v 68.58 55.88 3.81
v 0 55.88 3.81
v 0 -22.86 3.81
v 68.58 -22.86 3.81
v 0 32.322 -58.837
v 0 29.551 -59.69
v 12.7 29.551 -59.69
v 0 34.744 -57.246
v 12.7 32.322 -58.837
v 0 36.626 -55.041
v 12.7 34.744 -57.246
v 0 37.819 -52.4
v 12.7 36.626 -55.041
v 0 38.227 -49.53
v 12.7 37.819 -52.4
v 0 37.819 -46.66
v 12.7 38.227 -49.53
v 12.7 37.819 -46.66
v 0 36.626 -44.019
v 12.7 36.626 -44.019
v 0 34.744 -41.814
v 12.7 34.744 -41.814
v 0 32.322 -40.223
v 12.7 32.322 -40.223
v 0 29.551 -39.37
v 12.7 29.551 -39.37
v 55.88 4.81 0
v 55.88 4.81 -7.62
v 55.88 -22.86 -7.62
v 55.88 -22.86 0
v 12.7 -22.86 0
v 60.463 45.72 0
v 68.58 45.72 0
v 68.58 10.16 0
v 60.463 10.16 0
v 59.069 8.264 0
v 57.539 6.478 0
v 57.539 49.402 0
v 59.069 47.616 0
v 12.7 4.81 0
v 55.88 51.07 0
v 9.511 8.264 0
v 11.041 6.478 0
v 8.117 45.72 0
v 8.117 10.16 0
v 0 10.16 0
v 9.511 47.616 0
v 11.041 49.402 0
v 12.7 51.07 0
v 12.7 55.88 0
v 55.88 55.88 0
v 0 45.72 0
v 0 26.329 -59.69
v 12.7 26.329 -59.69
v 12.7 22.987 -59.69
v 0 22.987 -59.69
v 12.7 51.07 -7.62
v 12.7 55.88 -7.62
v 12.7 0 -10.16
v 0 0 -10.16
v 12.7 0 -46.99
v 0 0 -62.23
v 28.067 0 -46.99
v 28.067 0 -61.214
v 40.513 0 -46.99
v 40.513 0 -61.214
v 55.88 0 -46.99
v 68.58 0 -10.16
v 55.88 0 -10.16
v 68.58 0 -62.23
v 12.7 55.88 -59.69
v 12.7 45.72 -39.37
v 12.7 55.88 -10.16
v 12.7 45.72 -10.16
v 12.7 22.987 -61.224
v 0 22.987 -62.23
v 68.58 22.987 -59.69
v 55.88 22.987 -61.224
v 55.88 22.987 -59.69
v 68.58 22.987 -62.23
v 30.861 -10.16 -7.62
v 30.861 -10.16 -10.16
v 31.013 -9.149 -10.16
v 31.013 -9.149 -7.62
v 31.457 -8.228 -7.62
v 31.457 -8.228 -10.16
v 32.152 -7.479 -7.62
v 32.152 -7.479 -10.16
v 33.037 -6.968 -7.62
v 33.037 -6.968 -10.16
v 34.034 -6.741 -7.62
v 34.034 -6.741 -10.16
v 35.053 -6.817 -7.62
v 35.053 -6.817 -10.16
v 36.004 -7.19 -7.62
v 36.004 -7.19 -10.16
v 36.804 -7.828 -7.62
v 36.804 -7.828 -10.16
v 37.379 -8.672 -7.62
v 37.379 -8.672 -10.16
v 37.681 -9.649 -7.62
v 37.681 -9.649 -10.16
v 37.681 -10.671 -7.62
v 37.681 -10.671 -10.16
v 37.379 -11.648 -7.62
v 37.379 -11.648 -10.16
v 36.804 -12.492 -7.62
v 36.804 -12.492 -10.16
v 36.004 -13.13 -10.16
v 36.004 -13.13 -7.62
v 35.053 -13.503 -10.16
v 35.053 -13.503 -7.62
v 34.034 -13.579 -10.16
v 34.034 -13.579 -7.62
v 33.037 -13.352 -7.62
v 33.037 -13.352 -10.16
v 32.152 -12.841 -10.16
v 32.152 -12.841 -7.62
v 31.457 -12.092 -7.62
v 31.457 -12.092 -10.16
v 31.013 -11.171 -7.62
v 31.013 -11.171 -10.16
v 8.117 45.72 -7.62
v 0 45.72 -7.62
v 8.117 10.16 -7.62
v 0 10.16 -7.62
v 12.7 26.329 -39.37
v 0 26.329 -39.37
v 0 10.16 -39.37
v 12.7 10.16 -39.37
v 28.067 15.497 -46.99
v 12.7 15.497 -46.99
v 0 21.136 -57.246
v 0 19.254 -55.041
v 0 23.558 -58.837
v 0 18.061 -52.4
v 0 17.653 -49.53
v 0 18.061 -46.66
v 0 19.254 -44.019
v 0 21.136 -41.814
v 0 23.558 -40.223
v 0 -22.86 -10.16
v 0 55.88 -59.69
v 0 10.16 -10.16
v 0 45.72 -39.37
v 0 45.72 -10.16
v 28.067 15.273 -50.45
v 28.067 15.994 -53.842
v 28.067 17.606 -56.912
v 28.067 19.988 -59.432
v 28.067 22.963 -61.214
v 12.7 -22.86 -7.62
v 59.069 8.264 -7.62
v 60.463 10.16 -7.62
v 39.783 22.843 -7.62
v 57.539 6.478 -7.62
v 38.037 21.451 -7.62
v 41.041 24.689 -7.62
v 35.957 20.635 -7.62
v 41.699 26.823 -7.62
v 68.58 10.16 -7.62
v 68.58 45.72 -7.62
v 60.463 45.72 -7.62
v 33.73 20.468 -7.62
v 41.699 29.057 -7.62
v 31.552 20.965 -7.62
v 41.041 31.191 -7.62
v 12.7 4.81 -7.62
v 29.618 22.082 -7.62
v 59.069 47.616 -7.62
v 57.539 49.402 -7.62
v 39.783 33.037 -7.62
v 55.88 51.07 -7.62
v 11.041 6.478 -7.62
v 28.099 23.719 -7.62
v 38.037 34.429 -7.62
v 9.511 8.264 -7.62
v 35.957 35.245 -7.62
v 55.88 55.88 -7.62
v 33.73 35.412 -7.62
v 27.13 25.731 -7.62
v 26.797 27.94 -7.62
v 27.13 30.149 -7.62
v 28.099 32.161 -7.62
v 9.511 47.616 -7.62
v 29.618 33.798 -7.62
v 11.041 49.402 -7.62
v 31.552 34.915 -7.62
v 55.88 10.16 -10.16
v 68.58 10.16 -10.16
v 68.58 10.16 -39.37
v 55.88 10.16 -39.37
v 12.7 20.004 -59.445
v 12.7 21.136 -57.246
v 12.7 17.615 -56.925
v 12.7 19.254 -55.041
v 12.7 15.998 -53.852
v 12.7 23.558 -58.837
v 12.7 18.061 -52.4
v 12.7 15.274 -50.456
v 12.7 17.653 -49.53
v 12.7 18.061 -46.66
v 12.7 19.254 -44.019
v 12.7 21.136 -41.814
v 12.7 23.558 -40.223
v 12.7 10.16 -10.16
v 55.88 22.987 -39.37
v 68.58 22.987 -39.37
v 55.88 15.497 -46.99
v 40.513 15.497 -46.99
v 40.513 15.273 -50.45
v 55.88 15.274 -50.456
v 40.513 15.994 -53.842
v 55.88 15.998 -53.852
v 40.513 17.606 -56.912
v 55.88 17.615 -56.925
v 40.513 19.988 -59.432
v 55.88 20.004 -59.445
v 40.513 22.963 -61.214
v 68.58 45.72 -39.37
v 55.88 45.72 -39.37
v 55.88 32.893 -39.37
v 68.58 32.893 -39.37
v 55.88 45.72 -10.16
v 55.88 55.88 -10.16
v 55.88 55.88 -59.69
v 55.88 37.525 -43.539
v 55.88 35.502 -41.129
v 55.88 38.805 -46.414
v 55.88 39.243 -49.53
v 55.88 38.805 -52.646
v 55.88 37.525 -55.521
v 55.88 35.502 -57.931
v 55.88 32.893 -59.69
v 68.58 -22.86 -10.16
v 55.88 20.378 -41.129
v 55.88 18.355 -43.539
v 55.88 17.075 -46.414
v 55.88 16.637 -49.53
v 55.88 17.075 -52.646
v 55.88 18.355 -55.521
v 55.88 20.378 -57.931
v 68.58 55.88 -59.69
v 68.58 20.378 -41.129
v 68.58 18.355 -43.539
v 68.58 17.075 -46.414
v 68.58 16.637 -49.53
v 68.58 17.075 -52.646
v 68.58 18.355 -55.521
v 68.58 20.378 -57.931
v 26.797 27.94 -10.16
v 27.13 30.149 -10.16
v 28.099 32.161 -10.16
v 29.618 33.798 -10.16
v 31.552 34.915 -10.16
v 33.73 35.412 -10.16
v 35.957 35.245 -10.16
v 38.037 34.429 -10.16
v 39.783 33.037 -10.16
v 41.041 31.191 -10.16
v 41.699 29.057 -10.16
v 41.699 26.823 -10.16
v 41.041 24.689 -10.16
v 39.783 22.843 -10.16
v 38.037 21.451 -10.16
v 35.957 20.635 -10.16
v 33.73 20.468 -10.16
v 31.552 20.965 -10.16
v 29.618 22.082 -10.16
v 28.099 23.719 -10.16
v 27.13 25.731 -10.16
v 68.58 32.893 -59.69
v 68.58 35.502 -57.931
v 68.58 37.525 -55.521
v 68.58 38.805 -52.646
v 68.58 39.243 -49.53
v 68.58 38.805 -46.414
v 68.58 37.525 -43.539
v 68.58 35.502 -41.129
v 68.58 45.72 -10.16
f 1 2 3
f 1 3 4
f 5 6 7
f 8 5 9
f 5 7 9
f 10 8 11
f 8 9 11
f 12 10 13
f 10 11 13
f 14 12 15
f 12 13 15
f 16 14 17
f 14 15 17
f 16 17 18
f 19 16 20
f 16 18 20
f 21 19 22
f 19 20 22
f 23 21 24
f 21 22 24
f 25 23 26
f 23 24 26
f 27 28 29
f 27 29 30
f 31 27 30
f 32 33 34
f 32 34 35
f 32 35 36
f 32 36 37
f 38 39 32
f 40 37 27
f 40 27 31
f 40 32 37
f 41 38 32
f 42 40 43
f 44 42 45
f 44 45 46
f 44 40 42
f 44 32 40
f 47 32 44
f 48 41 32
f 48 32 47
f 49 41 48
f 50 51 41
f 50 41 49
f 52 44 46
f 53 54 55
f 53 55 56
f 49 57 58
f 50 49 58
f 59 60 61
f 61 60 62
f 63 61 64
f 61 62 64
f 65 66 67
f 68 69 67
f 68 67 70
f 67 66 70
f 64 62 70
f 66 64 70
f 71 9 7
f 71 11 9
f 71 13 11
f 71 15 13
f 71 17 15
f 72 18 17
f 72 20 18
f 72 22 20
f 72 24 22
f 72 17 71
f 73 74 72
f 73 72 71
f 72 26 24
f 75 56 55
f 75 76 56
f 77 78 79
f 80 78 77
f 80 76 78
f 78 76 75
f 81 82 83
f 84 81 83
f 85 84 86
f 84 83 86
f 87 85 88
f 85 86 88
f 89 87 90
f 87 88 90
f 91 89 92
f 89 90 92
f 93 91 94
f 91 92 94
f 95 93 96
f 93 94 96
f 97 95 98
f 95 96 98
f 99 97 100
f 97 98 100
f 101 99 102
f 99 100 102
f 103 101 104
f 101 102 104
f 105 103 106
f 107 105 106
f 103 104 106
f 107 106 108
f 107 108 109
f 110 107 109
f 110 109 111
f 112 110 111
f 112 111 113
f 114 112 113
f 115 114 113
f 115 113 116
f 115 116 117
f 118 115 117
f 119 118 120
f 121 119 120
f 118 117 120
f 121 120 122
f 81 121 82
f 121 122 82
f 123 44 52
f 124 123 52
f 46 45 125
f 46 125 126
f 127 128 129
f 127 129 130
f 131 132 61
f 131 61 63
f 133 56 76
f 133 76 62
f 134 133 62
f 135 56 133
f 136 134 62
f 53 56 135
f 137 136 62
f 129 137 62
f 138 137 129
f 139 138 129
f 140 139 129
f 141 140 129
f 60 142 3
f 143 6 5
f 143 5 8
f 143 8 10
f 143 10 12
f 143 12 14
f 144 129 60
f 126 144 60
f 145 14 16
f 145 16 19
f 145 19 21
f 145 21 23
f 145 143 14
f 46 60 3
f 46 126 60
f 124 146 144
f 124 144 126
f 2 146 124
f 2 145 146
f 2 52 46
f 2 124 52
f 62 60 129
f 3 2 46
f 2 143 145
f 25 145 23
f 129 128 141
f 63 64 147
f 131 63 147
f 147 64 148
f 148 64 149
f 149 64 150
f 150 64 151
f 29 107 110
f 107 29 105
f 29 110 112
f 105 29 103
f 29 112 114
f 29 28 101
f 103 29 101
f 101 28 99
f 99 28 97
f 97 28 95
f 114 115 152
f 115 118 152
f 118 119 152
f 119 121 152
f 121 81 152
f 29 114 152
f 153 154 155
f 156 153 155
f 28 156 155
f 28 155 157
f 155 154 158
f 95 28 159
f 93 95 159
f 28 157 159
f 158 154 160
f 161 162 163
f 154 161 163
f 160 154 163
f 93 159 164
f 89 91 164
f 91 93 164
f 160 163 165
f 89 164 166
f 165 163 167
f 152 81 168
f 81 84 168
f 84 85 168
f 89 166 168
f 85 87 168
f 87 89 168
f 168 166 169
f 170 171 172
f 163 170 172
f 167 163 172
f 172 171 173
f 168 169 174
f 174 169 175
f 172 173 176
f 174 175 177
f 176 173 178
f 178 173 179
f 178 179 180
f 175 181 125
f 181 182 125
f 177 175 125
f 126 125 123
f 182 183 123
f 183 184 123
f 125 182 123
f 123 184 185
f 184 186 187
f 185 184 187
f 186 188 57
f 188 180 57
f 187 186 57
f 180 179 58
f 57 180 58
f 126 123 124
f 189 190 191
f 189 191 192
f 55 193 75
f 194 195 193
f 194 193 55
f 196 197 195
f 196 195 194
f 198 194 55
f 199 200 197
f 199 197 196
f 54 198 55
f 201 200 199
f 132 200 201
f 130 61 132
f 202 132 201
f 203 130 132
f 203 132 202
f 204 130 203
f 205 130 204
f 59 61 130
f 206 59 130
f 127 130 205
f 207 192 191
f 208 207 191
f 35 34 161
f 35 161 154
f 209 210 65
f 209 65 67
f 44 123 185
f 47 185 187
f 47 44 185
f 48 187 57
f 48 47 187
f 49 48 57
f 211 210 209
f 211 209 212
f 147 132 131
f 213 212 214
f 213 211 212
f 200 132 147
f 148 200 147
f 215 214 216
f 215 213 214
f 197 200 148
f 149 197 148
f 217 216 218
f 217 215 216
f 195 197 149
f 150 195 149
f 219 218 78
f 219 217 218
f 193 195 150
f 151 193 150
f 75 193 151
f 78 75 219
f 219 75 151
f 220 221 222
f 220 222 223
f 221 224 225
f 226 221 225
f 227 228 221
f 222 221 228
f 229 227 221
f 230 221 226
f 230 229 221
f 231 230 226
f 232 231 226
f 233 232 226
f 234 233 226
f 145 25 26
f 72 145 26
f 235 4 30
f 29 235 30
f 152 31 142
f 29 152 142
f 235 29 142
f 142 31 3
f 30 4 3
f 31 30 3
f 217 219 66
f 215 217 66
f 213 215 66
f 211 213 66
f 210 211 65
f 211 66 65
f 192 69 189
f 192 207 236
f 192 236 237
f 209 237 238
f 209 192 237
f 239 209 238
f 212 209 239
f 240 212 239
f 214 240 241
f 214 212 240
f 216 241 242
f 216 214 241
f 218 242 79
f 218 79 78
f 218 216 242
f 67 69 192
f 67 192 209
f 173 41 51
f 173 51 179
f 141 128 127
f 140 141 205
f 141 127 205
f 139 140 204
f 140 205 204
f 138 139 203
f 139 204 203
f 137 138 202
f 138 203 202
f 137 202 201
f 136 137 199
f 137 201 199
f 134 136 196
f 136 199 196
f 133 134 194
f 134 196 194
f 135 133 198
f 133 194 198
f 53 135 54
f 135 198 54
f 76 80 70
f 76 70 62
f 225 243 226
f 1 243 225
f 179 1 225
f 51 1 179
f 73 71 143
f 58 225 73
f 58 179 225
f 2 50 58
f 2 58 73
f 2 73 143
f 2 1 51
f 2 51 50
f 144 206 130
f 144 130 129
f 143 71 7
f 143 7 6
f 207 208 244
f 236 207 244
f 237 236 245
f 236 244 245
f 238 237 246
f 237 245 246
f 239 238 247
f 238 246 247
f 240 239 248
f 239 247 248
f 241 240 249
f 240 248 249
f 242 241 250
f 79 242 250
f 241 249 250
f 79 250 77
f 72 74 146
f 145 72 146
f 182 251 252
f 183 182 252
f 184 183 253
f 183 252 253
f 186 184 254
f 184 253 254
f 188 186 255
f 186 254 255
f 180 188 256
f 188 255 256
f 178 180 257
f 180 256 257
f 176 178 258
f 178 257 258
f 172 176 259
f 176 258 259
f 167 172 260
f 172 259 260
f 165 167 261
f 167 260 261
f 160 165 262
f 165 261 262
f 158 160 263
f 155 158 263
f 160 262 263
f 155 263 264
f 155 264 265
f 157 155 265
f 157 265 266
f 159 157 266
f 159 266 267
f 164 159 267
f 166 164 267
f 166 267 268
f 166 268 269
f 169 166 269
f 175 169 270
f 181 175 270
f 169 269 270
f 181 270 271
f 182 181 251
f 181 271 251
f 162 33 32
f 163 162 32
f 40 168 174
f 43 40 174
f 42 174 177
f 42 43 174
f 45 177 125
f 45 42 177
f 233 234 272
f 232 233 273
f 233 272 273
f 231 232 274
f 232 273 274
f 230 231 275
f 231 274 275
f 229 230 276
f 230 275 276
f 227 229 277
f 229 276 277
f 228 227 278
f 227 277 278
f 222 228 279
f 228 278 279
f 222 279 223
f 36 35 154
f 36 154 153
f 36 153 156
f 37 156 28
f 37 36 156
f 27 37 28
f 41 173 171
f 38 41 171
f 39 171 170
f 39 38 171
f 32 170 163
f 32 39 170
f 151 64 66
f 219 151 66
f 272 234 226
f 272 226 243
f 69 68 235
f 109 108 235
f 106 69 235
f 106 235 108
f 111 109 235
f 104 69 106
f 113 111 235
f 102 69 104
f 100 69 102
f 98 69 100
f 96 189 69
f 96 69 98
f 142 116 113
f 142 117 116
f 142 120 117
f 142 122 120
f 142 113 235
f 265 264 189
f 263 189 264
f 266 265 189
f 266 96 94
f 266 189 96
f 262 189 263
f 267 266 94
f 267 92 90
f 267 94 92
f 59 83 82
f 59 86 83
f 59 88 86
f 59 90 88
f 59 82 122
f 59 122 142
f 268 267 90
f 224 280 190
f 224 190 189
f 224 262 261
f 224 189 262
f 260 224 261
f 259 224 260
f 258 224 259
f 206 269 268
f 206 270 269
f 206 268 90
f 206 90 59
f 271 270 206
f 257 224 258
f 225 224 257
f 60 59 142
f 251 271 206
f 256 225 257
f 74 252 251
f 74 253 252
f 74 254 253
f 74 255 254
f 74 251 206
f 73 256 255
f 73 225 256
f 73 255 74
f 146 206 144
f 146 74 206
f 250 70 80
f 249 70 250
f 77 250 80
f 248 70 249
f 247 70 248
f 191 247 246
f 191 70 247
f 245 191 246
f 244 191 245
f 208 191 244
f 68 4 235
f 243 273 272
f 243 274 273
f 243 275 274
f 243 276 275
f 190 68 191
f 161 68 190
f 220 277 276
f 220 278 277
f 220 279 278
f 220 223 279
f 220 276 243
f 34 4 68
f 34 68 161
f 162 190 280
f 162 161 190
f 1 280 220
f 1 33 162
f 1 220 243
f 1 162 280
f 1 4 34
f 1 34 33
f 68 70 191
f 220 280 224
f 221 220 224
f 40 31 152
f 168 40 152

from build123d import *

# Parameters (mm, degrees)
SKETCH1_W           = 68.58
SKETCH1_H           = 55.88
BOSS_EXTRUDE1_DEPTH = 3.81
SKETCH2_W           = 12.7
SKETCH2_H           = 10.16
BOSS_EXTRUDE2_DEPTH = 59.69
SKETCH6_W           = 12.7
SKETCH6_H           = 20.32
BOSS_EXTRUDE3_DEPTH = 35.56
CUT_EXTRUDE1_REACH  = 108.718
SKETCH4_R           = 11.303
SKETCH7_W           = 68.58
SKETCH7_H           = 55.88
SKETCH7_W_2         = 43.18
SKETCH7_H_2         = 22.86
BOSS_EXTRUDE4_DEPTH = 2.54
SKETCH8_R           = 3.429
SKETCH8_R_2         = 7.493
CUT_EXTRUDE2_DEPTH  = 2.54
SKETCH9_W           = 68.58
SKETCH9_H           = 22.987
BOSS_EXTRUDE5_DEPTH = 2.54
CUT_EXTRUDE3_REACH  = 110.159
SKETCH10_W          = 12.446
SKETCH10_H          = 3.048
SKETCH11_W          = 15.367
SKETCH11_H          = 22.987
BOSS_EXTRUDE6_DEPTH = 12.7
BOSS_EXTRUDE7_DEPTH = 22.86
CUT_EXTRUDE5_START  = -43.18
SKETCH14_R          = 12.7
CUT_EXTRUDE5_DEPTH  = 43.18
CUT_EXTRUDE6_REACH  = 102.587
SKETCH13_R          = 10.287
SKETCH15_R          = 31.640904619
CUT_EXTRUDE7_DEPTH  = 7.62


with BuildPart() as part:
    # Sketch1 → Boss-Extrude1 (new body)
    with BuildSketch(Plane.XY):
        with Locations((34.29, 27.94)):
            Rectangle(SKETCH1_W, SKETCH1_H)
    extrude(amount=BOSS_EXTRUDE1_DEPTH)

    # Sketch2 → Boss-Extrude2 (add)
    with BuildSketch(Plane(origin=(0, 0, 0), x_dir=(-1, 0, 0), z_dir=(0, 0, -1))):
        with Locations((-6.35, 50.8)):
            Rectangle(SKETCH2_W, SKETCH2_H)
        with Locations((-62.23, 50.8)):
            Rectangle(SKETCH2_W, SKETCH2_H)
        with Locations((-6.35, 5.08)):
            Rectangle(SKETCH2_W, SKETCH2_H)
        with Locations((-62.23, 5.08)):
            Rectangle(SKETCH2_W, SKETCH2_H)
    extrude(amount=BOSS_EXTRUDE2_DEPTH)

    # Sketch6 → Boss-Extrude3 (add)
    with BuildSketch(Plane(origin=(0, 10.16, 0), x_dir=(1, 0, 0), z_dir=(0, 1, 0))):
        with Locations((62.23, 49.53)):
            Rectangle(SKETCH6_W, SKETCH6_H)
        with Locations((6.35, 49.53)):
            Rectangle(SKETCH6_W, SKETCH6_H)
    extrude(amount=BOSS_EXTRUDE3_DEPTH)

    # Sketch4 → Cut-Extrude1 (cut, up to next)
    with BuildSketch(Plane(origin=(68.58, 0, 0), x_dir=(0, 0, -1), z_dir=(1, 0, 0)), mode=Mode.PRIVATE) as cut_extrude1_sk1:
        with Locations((49.53, 27.94)):
            Circle(SKETCH4_R)
    cut_extrude1_tool1 = extrude(cut_extrude1_sk1.sketch, amount=-CUT_EXTRUDE1_REACH, mode=Mode.PRIVATE) & part.part
    add(cut_extrude1_tool1.solids().sort_by_distance((68.58, 27.94, -49.53))[0], mode=Mode.SUBTRACT)

    # Sketch7 → Boss-Extrude4 (add)
    with BuildSketch(Plane(origin=(0, 0, -7.62), x_dir=(-1, 0, 0), z_dir=(0, 0, -1))):
        with Locations((-34.29, 27.94)):
            Rectangle(SKETCH7_W, SKETCH7_H)
        with Locations((-34.29, -11.43)):
            Rectangle(SKETCH7_W_2, SKETCH7_H_2)
    extrude(amount=BOSS_EXTRUDE4_DEPTH)

    # Sketch8 → Cut-Extrude2 (cut)
    with BuildSketch(Plane(origin=(0, 0, -10.16), x_dir=(-1, 0, 0), z_dir=(0, 0, -1))):
        with Locations((-34.29, -10.16)):
            Circle(SKETCH8_R)
        with Locations((-34.29, 27.94)):
            Circle(SKETCH8_R_2)
    extrude(amount=-CUT_EXTRUDE2_DEPTH, mode=Mode.SUBTRACT)

    # Sketch9 → Boss-Extrude5 (add)
    with BuildSketch(Plane(origin=(0, 0, -59.69), x_dir=(-1, 0, 0), z_dir=(0, 0, -1))):
        with Locations((-34.29, 11.4935)):
            Rectangle(SKETCH9_W, SKETCH9_H)
    extrude(amount=BOSS_EXTRUDE5_DEPTH)

    # Sketch10 → Cut-Extrude3 (cut, up to next)
    with BuildSketch(Plane.XZ, mode=Mode.PRIVATE) as cut_extrude3_sk1:
        with Locations((34.29, -59.69)):
            Rectangle(SKETCH10_W, SKETCH10_H)
    cut_extrude3_tool1 = extrude(cut_extrude3_sk1.sketch, amount=-CUT_EXTRUDE3_REACH, mode=Mode.PRIVATE) & part.part
    add(cut_extrude3_tool1.solids().sort_by_distance((34.29, 0, -59.69))[0], mode=Mode.SUBTRACT)

    # Sketch11 → Boss-Extrude6 (add)
    with BuildSketch(Plane.XY.offset(-59.69)):
        with Locations((20.3835, 11.4935)):
            Rectangle(SKETCH11_W, SKETCH11_H)
        with Locations((48.1965, 11.4935)):
            Rectangle(SKETCH11_W, SKETCH11_H)
    extrude(amount=BOSS_EXTRUDE6_DEPTH)

    # Sketch12 → Boss-Extrude7 (add)
    with BuildSketch(Plane.XZ):
        Polygon((12.7, -10.16), (0, -10.16), (0, 3.81), (68.58, 3.81), (68.58, -10.16), (55.88, -10.16), (55.88, 0), (12.7, 0), align=None)
    extrude(amount=BOSS_EXTRUDE7_DEPTH)

    # Sketch14 → Cut-Extrude5 (cut)
    with BuildSketch(Plane(origin=(55.88, 0, 0), x_dir=(0, 0, -1), z_dir=(1, 0, 0)).offset(CUT_EXTRUDE5_START)):
        with Locations((49.53, 27.94)):
            Circle(SKETCH14_R)
    extrude(amount=CUT_EXTRUDE5_DEPTH, mode=Mode.SUBTRACT)

    # Sketch13 → Cut-Extrude6 (cut, up to next)
    with BuildSketch(Plane(origin=(12.7, 0, 0), x_dir=(0, 0, -1), z_dir=(1, 0, 0)), mode=Mode.PRIVATE) as cut_extrude6_sk1:
        with Locations((49.53, 27.94)):
            Circle(SKETCH13_R)
    cut_extrude6_tool1 = extrude(cut_extrude6_sk1.sketch, amount=-CUT_EXTRUDE6_REACH, mode=Mode.PRIVATE) & part.part
    add(cut_extrude6_tool1.solids().sort_by_distance((12.7, 27.94, -49.53))[0], mode=Mode.SUBTRACT)

    # Sketch15 → Cut-Extrude7 (cut)
    with BuildSketch(Plane(origin=(0, 0, 0), x_dir=(-1, 0, 0), z_dir=(0, 0, -1))):
        with Locations((-34.29, 27.94)):
            Circle(SKETCH15_R)
    extrude(amount=CUT_EXTRUDE7_DEPTH, mode=Mode.SUBTRACT)


solid = part.part
